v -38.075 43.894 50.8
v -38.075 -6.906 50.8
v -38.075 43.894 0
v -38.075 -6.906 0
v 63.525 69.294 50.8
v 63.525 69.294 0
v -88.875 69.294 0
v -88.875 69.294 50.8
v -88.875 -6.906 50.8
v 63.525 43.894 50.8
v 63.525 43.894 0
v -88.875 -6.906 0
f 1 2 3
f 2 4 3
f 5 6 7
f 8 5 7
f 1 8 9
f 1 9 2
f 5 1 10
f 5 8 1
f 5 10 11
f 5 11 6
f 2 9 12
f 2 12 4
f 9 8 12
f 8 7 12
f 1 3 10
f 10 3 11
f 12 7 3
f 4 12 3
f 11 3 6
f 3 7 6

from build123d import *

# Parameters (mm, degrees)
F0_W     = 39.715842
F0_H     = 25.4
F1_DEPTH = 25.4
F2_DEPTH = 25.4


with BuildPart() as f1:
    # F0 (on Top) → F1 (new body)
    with BuildSketch(Plane.XY):
        Polygon((23.808891, 69.293525), (-88.875267, 69.293525), (-88.875267, -6.906475), (-38.075267, -6.906475), (-38.075267, 43.893525), (23.808891, 43.893525), align=None)
        with Locations((43.666812, 56.593525)):
            Rectangle(F0_W, F0_H)
    extrude(amount=F1_DEPTH)

    # F1_face (on face) → F2 (join)
    with BuildSketch(Plane(origin=(-32.995267, 41.353525, 25.4), x_dir=(1, 0, 0), z_dir=(0, 0, 1))):
        Polygon((96.52, 27.94), (-55.88, 27.94), (-55.88, -48.26), (-5.08, -48.26), (-5.08, 2.54), (96.52, 2.54), align=None)
    extrude(amount=F2_DEPTH)


solid = f1.part
